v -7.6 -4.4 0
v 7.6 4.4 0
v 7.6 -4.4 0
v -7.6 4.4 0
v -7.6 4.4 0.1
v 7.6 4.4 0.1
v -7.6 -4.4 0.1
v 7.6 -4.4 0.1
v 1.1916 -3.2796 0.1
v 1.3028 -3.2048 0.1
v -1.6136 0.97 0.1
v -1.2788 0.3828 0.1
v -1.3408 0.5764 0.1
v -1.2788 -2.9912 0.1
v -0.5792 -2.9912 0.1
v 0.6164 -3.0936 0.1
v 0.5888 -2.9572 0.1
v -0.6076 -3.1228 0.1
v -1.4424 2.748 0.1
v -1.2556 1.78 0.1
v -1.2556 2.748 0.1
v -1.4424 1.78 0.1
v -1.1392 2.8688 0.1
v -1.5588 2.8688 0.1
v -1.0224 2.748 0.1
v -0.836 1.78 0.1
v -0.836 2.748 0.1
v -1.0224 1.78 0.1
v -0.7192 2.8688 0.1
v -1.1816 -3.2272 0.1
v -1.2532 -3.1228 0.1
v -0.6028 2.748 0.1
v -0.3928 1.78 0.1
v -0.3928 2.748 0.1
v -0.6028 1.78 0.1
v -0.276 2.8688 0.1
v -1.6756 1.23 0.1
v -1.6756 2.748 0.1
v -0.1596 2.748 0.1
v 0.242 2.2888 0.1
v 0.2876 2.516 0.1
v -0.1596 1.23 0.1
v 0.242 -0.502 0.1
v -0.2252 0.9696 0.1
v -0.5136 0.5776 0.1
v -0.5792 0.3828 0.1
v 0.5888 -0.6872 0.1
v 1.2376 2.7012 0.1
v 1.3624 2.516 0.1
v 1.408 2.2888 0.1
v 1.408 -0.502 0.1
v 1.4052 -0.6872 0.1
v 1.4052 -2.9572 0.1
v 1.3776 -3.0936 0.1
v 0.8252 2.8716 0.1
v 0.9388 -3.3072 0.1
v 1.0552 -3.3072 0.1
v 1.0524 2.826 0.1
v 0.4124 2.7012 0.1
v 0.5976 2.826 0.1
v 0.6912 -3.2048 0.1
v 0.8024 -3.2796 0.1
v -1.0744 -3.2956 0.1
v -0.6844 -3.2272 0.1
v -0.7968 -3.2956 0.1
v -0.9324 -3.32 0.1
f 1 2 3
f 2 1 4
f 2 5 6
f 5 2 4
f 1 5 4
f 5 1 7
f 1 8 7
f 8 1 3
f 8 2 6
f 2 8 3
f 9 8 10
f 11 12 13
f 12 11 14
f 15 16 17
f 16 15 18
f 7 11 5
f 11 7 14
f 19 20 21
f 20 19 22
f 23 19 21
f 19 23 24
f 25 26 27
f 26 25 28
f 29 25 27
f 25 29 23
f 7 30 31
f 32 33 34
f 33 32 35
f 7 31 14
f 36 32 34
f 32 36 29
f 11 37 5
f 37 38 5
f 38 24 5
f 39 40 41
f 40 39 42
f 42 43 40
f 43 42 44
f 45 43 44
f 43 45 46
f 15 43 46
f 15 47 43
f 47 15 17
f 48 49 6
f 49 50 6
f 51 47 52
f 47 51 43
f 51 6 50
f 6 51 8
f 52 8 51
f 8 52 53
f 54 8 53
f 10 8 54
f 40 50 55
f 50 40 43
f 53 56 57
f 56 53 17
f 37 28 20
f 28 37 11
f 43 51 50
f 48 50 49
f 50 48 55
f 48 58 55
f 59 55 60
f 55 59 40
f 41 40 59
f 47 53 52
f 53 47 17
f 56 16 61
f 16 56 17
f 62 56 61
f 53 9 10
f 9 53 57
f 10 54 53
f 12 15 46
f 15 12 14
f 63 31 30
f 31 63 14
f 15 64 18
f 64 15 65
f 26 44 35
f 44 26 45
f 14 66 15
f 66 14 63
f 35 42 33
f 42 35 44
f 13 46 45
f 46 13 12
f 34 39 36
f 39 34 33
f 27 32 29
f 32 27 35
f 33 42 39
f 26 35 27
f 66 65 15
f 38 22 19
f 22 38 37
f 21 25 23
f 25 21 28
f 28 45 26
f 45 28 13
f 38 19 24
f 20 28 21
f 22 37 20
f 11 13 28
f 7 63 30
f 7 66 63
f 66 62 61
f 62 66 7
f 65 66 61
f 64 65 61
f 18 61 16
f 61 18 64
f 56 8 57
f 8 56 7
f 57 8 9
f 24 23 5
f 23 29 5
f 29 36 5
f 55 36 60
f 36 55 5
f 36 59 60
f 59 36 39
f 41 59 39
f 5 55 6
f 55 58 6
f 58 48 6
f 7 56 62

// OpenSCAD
// file: ../p/box5-12.scad
use <../lib.scad>
function ldraw_lib__box5_12() = [
// 0 Box with 5 Faces without Any Edges
// 0 Name: box5-12.dat
// 0 Author: Chris Dee [cwdee]
// 0 !LDRAW_ORG Primitive UPDATE 2009-02
// 0 !LICENSE Licensed under CC BY 2.0 and CC BY 4.0 : see CAreadme.txt
// 
// 0 BFC CERTIFY CCW
  [0,"BFC","CERTIFY"],
  [0,"BFC","CCW"],
// 
// 0 !HISTORY 2009-09-03 [PTadmin] Official Update 2009-02
// 
// 
// 4 16 1 1 1 1 1 -1 -1 1 -1 -1 1 1
  [4,16,1,1,1,1,1,-1,-1,1,-1,-1,1,1],
// 4 16 -1 0 1 1 0 1 1 1 1 -1 1 1
  [4,16,-1,0,1,1,0,1,1,1,1,-1,1,1],
// 4 16 -1 0 -1 -1 0 1 -1 1 1 -1 1 -1
  [4,16,-1,0,-1,-1,0,1,-1,1,1,-1,1,-1],
// 4 16 1 0 -1 -1 0 -1 -1 1 -1 1 1 -1
  [4,16,1,0,-1,-1,0,-1,-1,1,-1,1,1,-1],
// 4 16 1 0 1 1 0 -1 1 1 -1 1 1 1
  [4,16,1,0,1,1,0,-1,1,1,-1,1,1,1],
// 0
];
module ldraw_lib__box5_12(step=0, col=false, unit=2/5, alt=false, line=0.2, solid=!$preview)
    makepoly(ldraw_lib__box5_12(), step=step, col=col, unit=unit, alt=alt, line=line, solid=solid);
ldraw_lib__box5_12(line=0.2);
// main file
use <../lib.scad>
use <../p/box5-12.scad>
function ldraw_lib__164565d() = [
// 0 Sticker  1.1 x  1.9 with Blue Fork and Knife
// 0 Name: 164565d.dat
// 0 Author: Zoltan Keri [kzoltan82]
// 0 !LDRAW_ORG Part UPDATE 2018-01
// 0 !LICENSE Licensed under CC BY 2.0 and CC BY 4.0 : see CAreadme.txt
// 
// 0 BFC CERTIFY CCW
  [0,"BFC","CERTIFY"],
  [0,"BFC","CCW"],
// 
// 0 !KEYWORDS Metroliner, Restaurant, Set 4558, Train
// 
// 0 !HISTORY 2018-01-30 [PTadmin] Official Update 2018-01
// 
// 
// 1 16 0 -0.25 0 19 0 0 0 0.25 0 0 0 11 box5-12.dat
  [1,16,0,-0.25,0,19,0,0,0,0.25,0,0,0,11, ldraw_lib__box5_12()],
// 3 16 2.979 -0.25 -8.199 19 -0.25 -11 3.257 -0.25 -8.012
  [3,16,2.979,-0.25,-8.199,19,-0.25,-11,3.257,-0.25,-8.012],
// 4 16 -3.352 -0.25 1.441 -4.034 -0.25 2.425 -3.197 -0.25 -7.478 -3.197 -0.25 0.957
  [4,16,-3.352,-0.25,1.441,-4.034,-0.25,2.425,-3.197,-0.25,-7.478,-3.197,-0.25,0.957],
// 4 16 -1.519 -0.25 -7.807 1.541 -0.25 -7.734 1.472 -0.25 -7.393 -1.448 -0.25 -7.478
  [4,16,-1.519,-0.25,-7.807,1.541,-0.25,-7.734,1.472,-0.25,-7.393,-1.448,-0.25,-7.478],
// 4 16 -19 -0.25 11 -19 -0.25 -11 -3.197 -0.25 -7.478 -4.034 -0.25 2.425
  [4,16,-19,-0.25,11,-19,-0.25,-11,-3.197,-0.25,-7.478,-4.034,-0.25,2.425],
// 4 16 -3.139 -0.25 4.45 -3.139 -0.25 6.87 -3.606 -0.25 6.87 -3.606 -0.25 4.45
  [4,16,-3.139,-0.25,4.45,-3.139,-0.25,6.87,-3.606,-0.25,6.87,-3.606,-0.25,4.45],
// 4 16 -2.848 -0.25 7.172 -3.897 -0.25 7.172 -3.606 -0.25 6.87 -3.139 -0.25 6.87
  [4,16,-2.848,-0.25,7.172,-3.897,-0.25,7.172,-3.606,-0.25,6.87,-3.139,-0.25,6.87],
// 4 16 -2.09 -0.25 6.87 -2.556 -0.25 6.87 -2.556 -0.25 4.45 -2.09 -0.25 4.45
  [4,16,-2.09,-0.25,6.87,-2.556,-0.25,6.87,-2.556,-0.25,4.45,-2.09,-0.25,4.45],
// 4 16 -1.798 -0.25 7.172 -2.848 -0.25 7.172 -2.556 -0.25 6.87 -2.09 -0.25 6.87
  [4,16,-1.798,-0.25,7.172,-2.848,-0.25,7.172,-2.556,-0.25,6.87,-2.09,-0.25,6.87],
// 3 16 -19 -0.25 -11 -2.954 -0.25 -8.068 -3.133 -0.25 -7.807
  [3,16,-19,-0.25,-11,-2.954,-0.25,-8.068,-3.133,-0.25,-7.807],
// 4 16 -0.982 -0.25 6.87 -1.507 -0.25 6.87 -1.507 -0.25 4.45 -0.982 -0.25 4.45
  [4,16,-0.982,-0.25,6.87,-1.507,-0.25,6.87,-1.507,-0.25,4.45,-0.982,-0.25,4.45],
// 3 16 -19 -0.25 -11 -3.133 -0.25 -7.807 -3.197 -0.25 -7.478
  [3,16,-19,-0.25,-11,-3.133,-0.25,-7.807,-3.197,-0.25,-7.478],
// 4 16 -0.69 -0.25 7.172 -1.798 -0.25 7.172 -1.507 -0.25 6.87 -0.982 -0.25 6.87
  [4,16,-0.69,-0.25,7.172,-1.798,-0.25,7.172,-1.507,-0.25,6.87,-0.982,-0.25,6.87],
// 3 16 -4.034 -0.25 2.425 -4.189 -0.25 3.075 -19 -0.25 11
  [3,16,-4.034,-0.25,2.425,-4.189,-0.25,3.075,-19,-0.25,11],
// 3 16 -4.189 -0.25 3.075 -4.189 -0.25 6.87 -19 -0.25 11
  [3,16,-4.189,-0.25,3.075,-4.189,-0.25,6.87,-19,-0.25,11],
// 3 16 -4.189 -0.25 6.87 -3.897 -0.25 7.172 -19 -0.25 11
  [3,16,-4.189,-0.25,6.87,-3.897,-0.25,7.172,-19,-0.25,11],
// 4 16 -0.399 -0.25 3.075 0.605 -0.25 5.722 0.719 -0.25 6.29 -0.399 -0.25 6.87
  [4,16,-0.399,-0.25,3.075,0.605,-0.25,5.722,0.719,-0.25,6.29,-0.399,-0.25,6.87],
// 4 16 -0.563 -0.25 2.424 0.605 -0.25 -1.255 0.605 -0.25 5.722 -0.399 -0.25 3.075
  [4,16,-0.563,-0.25,2.424,0.605,-0.25,-1.255,0.605,-0.25,5.722,-0.399,-0.25,3.075],
// 4 16 -1.448 -0.25 0.957 0.605 -0.25 -1.255 -0.563 -0.25 2.424 -1.284 -0.25 1.444
  [4,16,-1.448,-0.25,0.957,0.605,-0.25,-1.255,-0.563,-0.25,2.424,-1.284,-0.25,1.444],
// 3 16 -1.448 -0.25 -7.478 0.605 -0.25 -1.255 -1.448 -0.25 0.957
  [3,16,-1.448,-0.25,-7.478,0.605,-0.25,-1.255,-1.448,-0.25,0.957],
// 4 16 1.472 -0.25 -7.393 1.472 -0.25 -1.718 0.605 -0.25 -1.255 -1.448 -0.25 -7.478
  [4,16,1.472,-0.25,-7.393,1.472,-0.25,-1.718,0.605,-0.25,-1.255,-1.448,-0.25,-7.478],
// 3 16 3.094 -0.25 6.753 3.406 -0.25 6.29 19 -0.25 11
  [3,16,3.094,-0.25,6.753,3.406,-0.25,6.29,19,-0.25,11],
// 3 16 3.406 -0.25 6.29 3.52 -0.25 5.722 19 -0.25 11
  [3,16,3.406,-0.25,6.29,3.52,-0.25,5.722,19,-0.25,11],
// 4 16 3.513 -0.25 -1.718 3.52 -0.25 -1.255 0.605 -0.25 -1.255 1.472 -0.25 -1.718
  [4,16,3.513,-0.25,-1.718,3.52,-0.25,-1.255,0.605,-0.25,-1.255,1.472,-0.25,-1.718],
// 4 16 19 -0.25 -11 19 -0.25 11 3.52 -0.25 5.722 3.52 -0.25 -1.255
  [4,16,19,-0.25,-11,19,-0.25,11,3.52,-0.25,5.722,3.52,-0.25,-1.255],
// 4 16 3.513 -0.25 -7.393 19 -0.25 -11 3.52 -0.25 -1.255 3.513 -0.25 -1.718
  [4,16,3.513,-0.25,-7.393,19,-0.25,-11,3.52,-0.25,-1.255,3.513,-0.25,-1.718],
// 3 16 3.444 -0.25 -7.734 19 -0.25 -11 3.513 -0.25 -7.393
  [3,16,3.444,-0.25,-7.734,19,-0.25,-11,3.513,-0.25,-7.393],
// 3 16 3.257 -0.25 -8.012 19 -0.25 -11 3.444 -0.25 -7.734
  [3,16,3.257,-0.25,-8.012,19,-0.25,-11,3.444,-0.25,-7.734],
// 4 1 0.605 -0.25 -1.255 3.52 -0.25 5.722 2.063 -0.25 7.179 0.605 -0.25 5.722
  [4,1,0.605,-0.25,-1.255,3.52,-0.25,5.722,2.063,-0.25,7.179,0.605,-0.25,5.722],
// 4 1 2.638 -0.25 -8.268 3.513 -0.25 -7.393 1.472 -0.25 -7.393 2.347 -0.25 -8.268
  [4,1,2.638,-0.25,-8.268,3.513,-0.25,-7.393,1.472,-0.25,-7.393,2.347,-0.25,-8.268],
// 4 1 -3.139 -0.25 4.45 -4.189 -0.25 3.075 -4.034 -0.25 2.425 -2.556 -0.25 4.45
  [4,1,-3.139,-0.25,4.45,-4.189,-0.25,3.075,-4.034,-0.25,2.425,-2.556,-0.25,4.45],
// 3 1 0.605 -0.25 -1.255 3.52 -0.25 -1.255 3.52 -0.25 5.722
  [3,1,0.605,-0.25,-1.255,3.52,-0.25,-1.255,3.52,-0.25,5.722],
// 4 1 2.063 -0.25 7.179 3.52 -0.25 5.722 3.406 -0.25 6.29 3.094 -0.25 6.753
  [4,1,2.063,-0.25,7.179,3.52,-0.25,5.722,3.406,-0.25,6.29,3.094,-0.25,6.753],
// 3 1 3.094 -0.25 6.753 2.631 -0.25 7.065 2.063 -0.25 7.179
  [3,1,3.094,-0.25,6.753,2.631,-0.25,7.065,2.063,-0.25,7.179],
// 4 1 0.605 -0.25 5.722 2.063 -0.25 7.179 1.494 -0.25 7.065 1.031 -0.25 6.753
  [4,1,0.605,-0.25,5.722,2.063,-0.25,7.179,1.494,-0.25,7.065,1.031,-0.25,6.753],
// 3 1 0.719 -0.25 6.29 0.605 -0.25 5.722 1.031 -0.25 6.753
  [3,1,0.719,-0.25,6.29,0.605,-0.25,5.722,1.031,-0.25,6.753],
// 4 1 3.513 -0.25 -7.393 3.513 -0.25 -1.718 1.472 -0.25 -1.718 1.472 -0.25 -7.393
  [4,1,3.513,-0.25,-7.393,3.513,-0.25,-1.718,1.472,-0.25,-1.718,1.472,-0.25,-7.393],
// 4 1 2.347 -0.25 -8.268 1.472 -0.25 -7.393 1.541 -0.25 -7.734 1.728 -0.25 -8.012
  [4,1,2.347,-0.25,-8.268,1.472,-0.25,-7.393,1.541,-0.25,-7.734,1.728,-0.25,-8.012],
// 3 1 2.006 -0.25 -8.199 2.347 -0.25 -8.268 1.728 -0.25 -8.012
  [3,1,2.006,-0.25,-8.199,2.347,-0.25,-8.268,1.728,-0.25,-8.012],
// 4 1 3.513 -0.25 -7.393 2.638 -0.25 -8.268 2.979 -0.25 -8.199 3.257 -0.25 -8.012
  [4,1,3.513,-0.25,-7.393,2.638,-0.25,-8.268,2.979,-0.25,-8.199,3.257,-0.25,-8.012],
// 3 1 3.257 -0.25 -8.012 3.444 -0.25 -7.734 3.513 -0.25 -7.393
  [3,1,3.257,-0.25,-8.012,3.444,-0.25,-7.734,3.513,-0.25,-7.393],
// 4 1 -1.448 -0.25 -7.478 -1.448 -0.25 0.957 -3.197 -0.25 0.957 -3.197 -0.25 -7.478
  [4,1,-1.448,-0.25,-7.478,-1.448,-0.25,0.957,-3.197,-0.25,0.957,-3.197,-0.25,-7.478],
// 4 1 -3.197 -0.25 -7.478 -3.133 -0.25 -7.807 -2.954 -0.25 -8.068 -2.686 -0.25 -8.239
  [4,1,-3.197,-0.25,-7.478,-3.133,-0.25,-7.807,-2.954,-0.25,-8.068,-2.686,-0.25,-8.239],
// 4 1 -1.519 -0.25 -7.807 -1.448 -0.25 -7.478 -1.992 -0.25 -8.239 -1.711 -0.25 -8.068
  [4,1,-1.519,-0.25,-7.807,-1.448,-0.25,-7.478,-1.992,-0.25,-8.239,-1.711,-0.25,-8.068],
// 4 1 -1.507 -0.25 4.45 -2.09 -0.25 4.45 -1.284 -0.25 1.444 -0.563 -0.25 2.424
  [4,1,-1.507,-0.25,4.45,-2.09,-0.25,4.45,-1.284,-0.25,1.444,-0.563,-0.25,2.424],
// 4 1 -2.686 -0.25 -8.239 -2.331 -0.25 -8.3 -1.448 -0.25 -7.478 -3.197 -0.25 -7.478
  [4,1,-2.686,-0.25,-8.239,-2.331,-0.25,-8.3,-1.448,-0.25,-7.478,-3.197,-0.25,-7.478],
// 4 1 -0.982 -0.25 4.45 -1.507 -0.25 4.45 -0.563 -0.25 2.424 -0.399 -0.25 3.075
  [4,1,-0.982,-0.25,4.45,-1.507,-0.25,4.45,-0.563,-0.25,2.424,-0.399,-0.25,3.075],
// 4 1 -3.197 -0.25 0.957 -1.448 -0.25 0.957 -1.284 -0.25 1.444 -3.352 -0.25 1.441
  [4,1,-3.197,-0.25,0.957,-1.448,-0.25,0.957,-1.284,-0.25,1.444,-3.352,-0.25,1.441],
// 4 1 -0.982 -0.25 4.45 -0.399 -0.25 6.87 -0.69 -0.25 7.172 -0.982 -0.25 6.87
  [4,1,-0.982,-0.25,4.45,-0.399,-0.25,6.87,-0.69,-0.25,7.172,-0.982,-0.25,6.87],
// 4 1 -1.798 -0.25 7.172 -2.09 -0.25 6.87 -1.507 -0.25 4.45 -1.507 -0.25 6.87
  [4,1,-1.798,-0.25,7.172,-2.09,-0.25,6.87,-1.507,-0.25,4.45,-1.507,-0.25,6.87],
// 3 1 -0.982 -0.25 4.45 -0.399 -0.25 3.075 -0.399 -0.25 6.87
  [3,1,-0.982,-0.25,4.45,-0.399,-0.25,3.075,-0.399,-0.25,6.87],
// 3 1 -2.09 -0.25 4.45 -1.507 -0.25 4.45 -2.09 -0.25 6.87
  [3,1,-2.09,-0.25,4.45,-1.507,-0.25,4.45,-2.09,-0.25,6.87],
// 3 1 -2.331 -0.25 -8.3 -1.992 -0.25 -8.239 -1.448 -0.25 -7.478
  [3,1,-2.331,-0.25,-8.3,-1.992,-0.25,-8.239,-1.448,-0.25,-7.478],
// 4 1 -3.606 -0.25 6.87 -4.189 -0.25 6.87 -4.189 -0.25 3.075 -3.606 -0.25 4.45
  [4,1,-3.606,-0.25,6.87,-4.189,-0.25,6.87,-4.189,-0.25,3.075,-3.606,-0.25,4.45],
// 4 1 -2.848 -0.25 7.172 -3.139 -0.25 6.87 -2.556 -0.25 4.45 -2.556 -0.25 6.87
  [4,1,-2.848,-0.25,7.172,-3.139,-0.25,6.87,-2.556,-0.25,4.45,-2.556,-0.25,6.87],
// 4 1 -2.556 -0.25 4.45 -3.352 -0.25 1.441 -1.284 -0.25 1.444 -2.09 -0.25 4.45
  [4,1,-2.556,-0.25,4.45,-3.352,-0.25,1.441,-1.284,-0.25,1.444,-2.09,-0.25,4.45],
// 3 1 -4.189 -0.25 6.87 -3.606 -0.25 6.87 -3.897 -0.25 7.172
  [3,1,-4.189,-0.25,6.87,-3.606,-0.25,6.87,-3.897,-0.25,7.172],
// 3 1 -3.139 -0.25 4.45 -2.556 -0.25 4.45 -3.139 -0.25 6.87
  [3,1,-3.139,-0.25,4.45,-2.556,-0.25,4.45,-3.139,-0.25,6.87],
// 3 1 -3.606 -0.25 4.45 -4.189 -0.25 3.075 -3.139 -0.25 4.45
  [3,1,-3.606,-0.25,4.45,-4.189,-0.25,3.075,-3.139,-0.25,4.45],
// 3 1 -4.034 -0.25 2.425 -3.352 -0.25 1.441 -2.556 -0.25 4.45
  [3,1,-4.034,-0.25,2.425,-3.352,-0.25,1.441,-2.556,-0.25,4.45],
// 3 16 -19 -0.25 -11 -2.686 -0.25 -8.239 -2.954 -0.25 -8.068
  [3,16,-19,-0.25,-11,-2.686,-0.25,-8.239,-2.954,-0.25,-8.068],
// 3 16 -19 -0.25 -11 -2.331 -0.25 -8.3 -2.686 -0.25 -8.239
  [3,16,-19,-0.25,-11,-2.331,-0.25,-8.3,-2.686,-0.25,-8.239],
// 4 16 2.006 -0.25 -8.199 1.728 -0.25 -8.012 -2.331 -0.25 -8.3 -19 -0.25 -11
  [4,16,2.006,-0.25,-8.199,1.728,-0.25,-8.012,-2.331,-0.25,-8.3,-19,-0.25,-11],
// 3 16 -1.992 -0.25 -8.239 -2.331 -0.25 -8.3 1.728 -0.25 -8.012
  [3,16,-1.992,-0.25,-8.239,-2.331,-0.25,-8.3,1.728,-0.25,-8.012],
// 3 16 -1.711 -0.25 -8.068 -1.992 -0.25 -8.239 1.728 -0.25 -8.012
  [3,16,-1.711,-0.25,-8.068,-1.992,-0.25,-8.239,1.728,-0.25,-8.012],
// 4 16 1.541 -0.25 -7.734 -1.519 -0.25 -7.807 -1.711 -0.25 -8.068 1.728 -0.25 -8.012
  [4,16,1.541,-0.25,-7.734,-1.519,-0.25,-7.807,-1.711,-0.25,-8.068,1.728,-0.25,-8.012],
// 4 16 2.347 -0.25 -8.268 -19 -0.25 -11 19 -0.25 -11 2.638 -0.25 -8.268
  [4,16,2.347,-0.25,-8.268,-19,-0.25,-11,19,-0.25,-11,2.638,-0.25,-8.268],
// 3 16 2.638 -0.25 -8.268 19 -0.25 -11 2.979 -0.25 -8.199
  [3,16,2.638,-0.25,-8.268,19,-0.25,-11,2.979,-0.25,-8.199],
// 3 16 -3.897 -0.25 7.172 -2.848 -0.25 7.172 -19 -0.25 11
  [3,16,-3.897,-0.25,7.172,-2.848,-0.25,7.172,-19,-0.25,11],
// 3 16 -2.848 -0.25 7.172 -1.798 -0.25 7.172 -19 -0.25 11
  [3,16,-2.848,-0.25,7.172,-1.798,-0.25,7.172,-19,-0.25,11],
// 3 16 -1.798 -0.25 7.172 -0.69 -0.25 7.172 -19 -0.25 11
  [3,16,-1.798,-0.25,7.172,-0.69,-0.25,7.172,-19,-0.25,11],
// 4 16 2.063 -0.25 7.179 -19 -0.25 11 -0.69 -0.25 7.172 1.494 -0.25 7.065
  [4,16,2.063,-0.25,7.179,-19,-0.25,11,-0.69,-0.25,7.172,1.494,-0.25,7.065],
// 4 16 -0.399 -0.25 6.87 1.031 -0.25 6.753 1.494 -0.25 7.065 -0.69 -0.25 7.172
  [4,16,-0.399,-0.25,6.87,1.031,-0.25,6.753,1.494,-0.25,7.065,-0.69,-0.25,7.172],
// 3 16 0.719 -0.25 6.29 1.031 -0.25 6.753 -0.399 -0.25 6.87
  [3,16,0.719,-0.25,6.29,1.031,-0.25,6.753,-0.399,-0.25,6.87],
// 3 16 -19 -0.25 11 2.063 -0.25 7.179 19 -0.25 11
  [3,16,-19,-0.25,11,2.063,-0.25,7.179,19,-0.25,11],
// 3 16 2.063 -0.25 7.179 2.631 -0.25 7.065 19 -0.25 11
  [3,16,2.063,-0.25,7.179,2.631,-0.25,7.065,19,-0.25,11],
// 3 16 2.631 -0.25 7.065 3.094 -0.25 6.753 19 -0.25 11
  [3,16,2.631,-0.25,7.065,3.094,-0.25,6.753,19,-0.25,11],
// 3 16 -19 -0.25 -11 2.347 -0.25 -8.268 2.006 -0.25 -8.199
  [3,16,-19,-0.25,-11,2.347,-0.25,-8.268,2.006,-0.25,-8.199],
];
module ldraw_lib__164565d(step=0, col=false, unit=2/5, alt=false, line=0.2, solid=!$preview)
    makepoly(ldraw_lib__164565d(), step=step, col=col, unit=unit, alt=alt, line=line, solid=solid);
ldraw_lib__164565d(line=0.2);
